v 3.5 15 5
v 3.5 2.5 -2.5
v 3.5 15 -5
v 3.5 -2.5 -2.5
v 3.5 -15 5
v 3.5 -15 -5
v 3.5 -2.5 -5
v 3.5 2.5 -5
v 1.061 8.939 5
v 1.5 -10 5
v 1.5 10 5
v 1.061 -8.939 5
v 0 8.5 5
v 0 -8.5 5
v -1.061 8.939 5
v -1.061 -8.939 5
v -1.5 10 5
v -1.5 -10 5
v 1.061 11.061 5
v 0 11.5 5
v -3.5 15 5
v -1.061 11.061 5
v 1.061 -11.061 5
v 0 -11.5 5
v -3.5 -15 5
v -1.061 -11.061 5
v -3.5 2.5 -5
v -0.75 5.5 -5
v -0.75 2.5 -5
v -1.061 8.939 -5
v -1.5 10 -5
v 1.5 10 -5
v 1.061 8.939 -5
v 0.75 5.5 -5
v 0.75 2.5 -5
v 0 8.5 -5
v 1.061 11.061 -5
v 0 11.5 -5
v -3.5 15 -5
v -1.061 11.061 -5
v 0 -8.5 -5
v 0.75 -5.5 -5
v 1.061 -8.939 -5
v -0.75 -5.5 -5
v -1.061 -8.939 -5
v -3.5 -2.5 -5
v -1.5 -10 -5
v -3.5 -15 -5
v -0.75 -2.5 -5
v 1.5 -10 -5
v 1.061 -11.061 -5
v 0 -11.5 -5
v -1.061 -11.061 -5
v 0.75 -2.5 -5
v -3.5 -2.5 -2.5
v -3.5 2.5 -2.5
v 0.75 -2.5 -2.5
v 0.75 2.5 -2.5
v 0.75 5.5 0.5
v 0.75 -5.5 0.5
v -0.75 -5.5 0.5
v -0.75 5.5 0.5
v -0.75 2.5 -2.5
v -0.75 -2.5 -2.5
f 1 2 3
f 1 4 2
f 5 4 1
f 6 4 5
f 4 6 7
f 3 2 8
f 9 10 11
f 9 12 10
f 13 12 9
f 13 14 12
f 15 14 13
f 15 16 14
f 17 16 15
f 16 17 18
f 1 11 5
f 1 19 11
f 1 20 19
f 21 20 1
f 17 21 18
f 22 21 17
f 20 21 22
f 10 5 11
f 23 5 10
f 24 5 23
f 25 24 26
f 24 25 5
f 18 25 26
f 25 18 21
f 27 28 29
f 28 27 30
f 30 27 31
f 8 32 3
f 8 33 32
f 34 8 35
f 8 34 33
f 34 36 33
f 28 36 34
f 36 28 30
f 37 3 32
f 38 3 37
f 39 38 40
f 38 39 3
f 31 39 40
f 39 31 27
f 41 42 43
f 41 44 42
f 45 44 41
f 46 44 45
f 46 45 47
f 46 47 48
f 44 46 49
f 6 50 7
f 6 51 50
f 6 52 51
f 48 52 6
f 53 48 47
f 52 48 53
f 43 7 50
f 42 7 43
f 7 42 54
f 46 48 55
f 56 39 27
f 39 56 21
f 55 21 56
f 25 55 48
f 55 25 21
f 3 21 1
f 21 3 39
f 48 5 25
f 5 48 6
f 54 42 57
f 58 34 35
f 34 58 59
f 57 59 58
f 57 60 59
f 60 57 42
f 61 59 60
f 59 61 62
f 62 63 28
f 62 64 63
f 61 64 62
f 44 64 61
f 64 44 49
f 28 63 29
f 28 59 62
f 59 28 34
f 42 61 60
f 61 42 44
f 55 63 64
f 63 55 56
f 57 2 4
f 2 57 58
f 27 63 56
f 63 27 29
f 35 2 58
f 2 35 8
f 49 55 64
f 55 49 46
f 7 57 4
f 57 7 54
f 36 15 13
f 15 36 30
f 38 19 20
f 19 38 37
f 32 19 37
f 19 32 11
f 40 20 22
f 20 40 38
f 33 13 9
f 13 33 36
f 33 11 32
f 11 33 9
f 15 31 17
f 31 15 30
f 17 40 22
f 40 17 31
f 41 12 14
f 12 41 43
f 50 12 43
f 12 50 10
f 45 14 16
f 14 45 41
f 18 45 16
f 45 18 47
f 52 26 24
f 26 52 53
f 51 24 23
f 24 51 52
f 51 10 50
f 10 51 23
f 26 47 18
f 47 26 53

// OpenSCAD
module 532nmPassFilterTop(){
	difference(){
		//filterHolderTop
		translate([0,0,0]) color([0.8,1,.6]) cube(size=[7,30,10],center=true);	
		//filterHolderIndentation
		translate([0,0,-5]) color([01,1,.6]) cube(size=[1.5,11,11],center=true);	
		//filterHole
		translate([0,0,-5]) color([01,1,.6]) cube(size=[20,5,5],center=true);
		//screwHoles
		translate([0,10,0]) color([1,0,0]) cylinder(h=15,r=1.5,$fn=8,center=true);
		translate([0,-10,0]) color([1,0,0]) cylinder(h=15,r=1.5,$fn=8,center=true);
	}
}
translate([0,0,0]){
	532nmPassFilterTop();
}
